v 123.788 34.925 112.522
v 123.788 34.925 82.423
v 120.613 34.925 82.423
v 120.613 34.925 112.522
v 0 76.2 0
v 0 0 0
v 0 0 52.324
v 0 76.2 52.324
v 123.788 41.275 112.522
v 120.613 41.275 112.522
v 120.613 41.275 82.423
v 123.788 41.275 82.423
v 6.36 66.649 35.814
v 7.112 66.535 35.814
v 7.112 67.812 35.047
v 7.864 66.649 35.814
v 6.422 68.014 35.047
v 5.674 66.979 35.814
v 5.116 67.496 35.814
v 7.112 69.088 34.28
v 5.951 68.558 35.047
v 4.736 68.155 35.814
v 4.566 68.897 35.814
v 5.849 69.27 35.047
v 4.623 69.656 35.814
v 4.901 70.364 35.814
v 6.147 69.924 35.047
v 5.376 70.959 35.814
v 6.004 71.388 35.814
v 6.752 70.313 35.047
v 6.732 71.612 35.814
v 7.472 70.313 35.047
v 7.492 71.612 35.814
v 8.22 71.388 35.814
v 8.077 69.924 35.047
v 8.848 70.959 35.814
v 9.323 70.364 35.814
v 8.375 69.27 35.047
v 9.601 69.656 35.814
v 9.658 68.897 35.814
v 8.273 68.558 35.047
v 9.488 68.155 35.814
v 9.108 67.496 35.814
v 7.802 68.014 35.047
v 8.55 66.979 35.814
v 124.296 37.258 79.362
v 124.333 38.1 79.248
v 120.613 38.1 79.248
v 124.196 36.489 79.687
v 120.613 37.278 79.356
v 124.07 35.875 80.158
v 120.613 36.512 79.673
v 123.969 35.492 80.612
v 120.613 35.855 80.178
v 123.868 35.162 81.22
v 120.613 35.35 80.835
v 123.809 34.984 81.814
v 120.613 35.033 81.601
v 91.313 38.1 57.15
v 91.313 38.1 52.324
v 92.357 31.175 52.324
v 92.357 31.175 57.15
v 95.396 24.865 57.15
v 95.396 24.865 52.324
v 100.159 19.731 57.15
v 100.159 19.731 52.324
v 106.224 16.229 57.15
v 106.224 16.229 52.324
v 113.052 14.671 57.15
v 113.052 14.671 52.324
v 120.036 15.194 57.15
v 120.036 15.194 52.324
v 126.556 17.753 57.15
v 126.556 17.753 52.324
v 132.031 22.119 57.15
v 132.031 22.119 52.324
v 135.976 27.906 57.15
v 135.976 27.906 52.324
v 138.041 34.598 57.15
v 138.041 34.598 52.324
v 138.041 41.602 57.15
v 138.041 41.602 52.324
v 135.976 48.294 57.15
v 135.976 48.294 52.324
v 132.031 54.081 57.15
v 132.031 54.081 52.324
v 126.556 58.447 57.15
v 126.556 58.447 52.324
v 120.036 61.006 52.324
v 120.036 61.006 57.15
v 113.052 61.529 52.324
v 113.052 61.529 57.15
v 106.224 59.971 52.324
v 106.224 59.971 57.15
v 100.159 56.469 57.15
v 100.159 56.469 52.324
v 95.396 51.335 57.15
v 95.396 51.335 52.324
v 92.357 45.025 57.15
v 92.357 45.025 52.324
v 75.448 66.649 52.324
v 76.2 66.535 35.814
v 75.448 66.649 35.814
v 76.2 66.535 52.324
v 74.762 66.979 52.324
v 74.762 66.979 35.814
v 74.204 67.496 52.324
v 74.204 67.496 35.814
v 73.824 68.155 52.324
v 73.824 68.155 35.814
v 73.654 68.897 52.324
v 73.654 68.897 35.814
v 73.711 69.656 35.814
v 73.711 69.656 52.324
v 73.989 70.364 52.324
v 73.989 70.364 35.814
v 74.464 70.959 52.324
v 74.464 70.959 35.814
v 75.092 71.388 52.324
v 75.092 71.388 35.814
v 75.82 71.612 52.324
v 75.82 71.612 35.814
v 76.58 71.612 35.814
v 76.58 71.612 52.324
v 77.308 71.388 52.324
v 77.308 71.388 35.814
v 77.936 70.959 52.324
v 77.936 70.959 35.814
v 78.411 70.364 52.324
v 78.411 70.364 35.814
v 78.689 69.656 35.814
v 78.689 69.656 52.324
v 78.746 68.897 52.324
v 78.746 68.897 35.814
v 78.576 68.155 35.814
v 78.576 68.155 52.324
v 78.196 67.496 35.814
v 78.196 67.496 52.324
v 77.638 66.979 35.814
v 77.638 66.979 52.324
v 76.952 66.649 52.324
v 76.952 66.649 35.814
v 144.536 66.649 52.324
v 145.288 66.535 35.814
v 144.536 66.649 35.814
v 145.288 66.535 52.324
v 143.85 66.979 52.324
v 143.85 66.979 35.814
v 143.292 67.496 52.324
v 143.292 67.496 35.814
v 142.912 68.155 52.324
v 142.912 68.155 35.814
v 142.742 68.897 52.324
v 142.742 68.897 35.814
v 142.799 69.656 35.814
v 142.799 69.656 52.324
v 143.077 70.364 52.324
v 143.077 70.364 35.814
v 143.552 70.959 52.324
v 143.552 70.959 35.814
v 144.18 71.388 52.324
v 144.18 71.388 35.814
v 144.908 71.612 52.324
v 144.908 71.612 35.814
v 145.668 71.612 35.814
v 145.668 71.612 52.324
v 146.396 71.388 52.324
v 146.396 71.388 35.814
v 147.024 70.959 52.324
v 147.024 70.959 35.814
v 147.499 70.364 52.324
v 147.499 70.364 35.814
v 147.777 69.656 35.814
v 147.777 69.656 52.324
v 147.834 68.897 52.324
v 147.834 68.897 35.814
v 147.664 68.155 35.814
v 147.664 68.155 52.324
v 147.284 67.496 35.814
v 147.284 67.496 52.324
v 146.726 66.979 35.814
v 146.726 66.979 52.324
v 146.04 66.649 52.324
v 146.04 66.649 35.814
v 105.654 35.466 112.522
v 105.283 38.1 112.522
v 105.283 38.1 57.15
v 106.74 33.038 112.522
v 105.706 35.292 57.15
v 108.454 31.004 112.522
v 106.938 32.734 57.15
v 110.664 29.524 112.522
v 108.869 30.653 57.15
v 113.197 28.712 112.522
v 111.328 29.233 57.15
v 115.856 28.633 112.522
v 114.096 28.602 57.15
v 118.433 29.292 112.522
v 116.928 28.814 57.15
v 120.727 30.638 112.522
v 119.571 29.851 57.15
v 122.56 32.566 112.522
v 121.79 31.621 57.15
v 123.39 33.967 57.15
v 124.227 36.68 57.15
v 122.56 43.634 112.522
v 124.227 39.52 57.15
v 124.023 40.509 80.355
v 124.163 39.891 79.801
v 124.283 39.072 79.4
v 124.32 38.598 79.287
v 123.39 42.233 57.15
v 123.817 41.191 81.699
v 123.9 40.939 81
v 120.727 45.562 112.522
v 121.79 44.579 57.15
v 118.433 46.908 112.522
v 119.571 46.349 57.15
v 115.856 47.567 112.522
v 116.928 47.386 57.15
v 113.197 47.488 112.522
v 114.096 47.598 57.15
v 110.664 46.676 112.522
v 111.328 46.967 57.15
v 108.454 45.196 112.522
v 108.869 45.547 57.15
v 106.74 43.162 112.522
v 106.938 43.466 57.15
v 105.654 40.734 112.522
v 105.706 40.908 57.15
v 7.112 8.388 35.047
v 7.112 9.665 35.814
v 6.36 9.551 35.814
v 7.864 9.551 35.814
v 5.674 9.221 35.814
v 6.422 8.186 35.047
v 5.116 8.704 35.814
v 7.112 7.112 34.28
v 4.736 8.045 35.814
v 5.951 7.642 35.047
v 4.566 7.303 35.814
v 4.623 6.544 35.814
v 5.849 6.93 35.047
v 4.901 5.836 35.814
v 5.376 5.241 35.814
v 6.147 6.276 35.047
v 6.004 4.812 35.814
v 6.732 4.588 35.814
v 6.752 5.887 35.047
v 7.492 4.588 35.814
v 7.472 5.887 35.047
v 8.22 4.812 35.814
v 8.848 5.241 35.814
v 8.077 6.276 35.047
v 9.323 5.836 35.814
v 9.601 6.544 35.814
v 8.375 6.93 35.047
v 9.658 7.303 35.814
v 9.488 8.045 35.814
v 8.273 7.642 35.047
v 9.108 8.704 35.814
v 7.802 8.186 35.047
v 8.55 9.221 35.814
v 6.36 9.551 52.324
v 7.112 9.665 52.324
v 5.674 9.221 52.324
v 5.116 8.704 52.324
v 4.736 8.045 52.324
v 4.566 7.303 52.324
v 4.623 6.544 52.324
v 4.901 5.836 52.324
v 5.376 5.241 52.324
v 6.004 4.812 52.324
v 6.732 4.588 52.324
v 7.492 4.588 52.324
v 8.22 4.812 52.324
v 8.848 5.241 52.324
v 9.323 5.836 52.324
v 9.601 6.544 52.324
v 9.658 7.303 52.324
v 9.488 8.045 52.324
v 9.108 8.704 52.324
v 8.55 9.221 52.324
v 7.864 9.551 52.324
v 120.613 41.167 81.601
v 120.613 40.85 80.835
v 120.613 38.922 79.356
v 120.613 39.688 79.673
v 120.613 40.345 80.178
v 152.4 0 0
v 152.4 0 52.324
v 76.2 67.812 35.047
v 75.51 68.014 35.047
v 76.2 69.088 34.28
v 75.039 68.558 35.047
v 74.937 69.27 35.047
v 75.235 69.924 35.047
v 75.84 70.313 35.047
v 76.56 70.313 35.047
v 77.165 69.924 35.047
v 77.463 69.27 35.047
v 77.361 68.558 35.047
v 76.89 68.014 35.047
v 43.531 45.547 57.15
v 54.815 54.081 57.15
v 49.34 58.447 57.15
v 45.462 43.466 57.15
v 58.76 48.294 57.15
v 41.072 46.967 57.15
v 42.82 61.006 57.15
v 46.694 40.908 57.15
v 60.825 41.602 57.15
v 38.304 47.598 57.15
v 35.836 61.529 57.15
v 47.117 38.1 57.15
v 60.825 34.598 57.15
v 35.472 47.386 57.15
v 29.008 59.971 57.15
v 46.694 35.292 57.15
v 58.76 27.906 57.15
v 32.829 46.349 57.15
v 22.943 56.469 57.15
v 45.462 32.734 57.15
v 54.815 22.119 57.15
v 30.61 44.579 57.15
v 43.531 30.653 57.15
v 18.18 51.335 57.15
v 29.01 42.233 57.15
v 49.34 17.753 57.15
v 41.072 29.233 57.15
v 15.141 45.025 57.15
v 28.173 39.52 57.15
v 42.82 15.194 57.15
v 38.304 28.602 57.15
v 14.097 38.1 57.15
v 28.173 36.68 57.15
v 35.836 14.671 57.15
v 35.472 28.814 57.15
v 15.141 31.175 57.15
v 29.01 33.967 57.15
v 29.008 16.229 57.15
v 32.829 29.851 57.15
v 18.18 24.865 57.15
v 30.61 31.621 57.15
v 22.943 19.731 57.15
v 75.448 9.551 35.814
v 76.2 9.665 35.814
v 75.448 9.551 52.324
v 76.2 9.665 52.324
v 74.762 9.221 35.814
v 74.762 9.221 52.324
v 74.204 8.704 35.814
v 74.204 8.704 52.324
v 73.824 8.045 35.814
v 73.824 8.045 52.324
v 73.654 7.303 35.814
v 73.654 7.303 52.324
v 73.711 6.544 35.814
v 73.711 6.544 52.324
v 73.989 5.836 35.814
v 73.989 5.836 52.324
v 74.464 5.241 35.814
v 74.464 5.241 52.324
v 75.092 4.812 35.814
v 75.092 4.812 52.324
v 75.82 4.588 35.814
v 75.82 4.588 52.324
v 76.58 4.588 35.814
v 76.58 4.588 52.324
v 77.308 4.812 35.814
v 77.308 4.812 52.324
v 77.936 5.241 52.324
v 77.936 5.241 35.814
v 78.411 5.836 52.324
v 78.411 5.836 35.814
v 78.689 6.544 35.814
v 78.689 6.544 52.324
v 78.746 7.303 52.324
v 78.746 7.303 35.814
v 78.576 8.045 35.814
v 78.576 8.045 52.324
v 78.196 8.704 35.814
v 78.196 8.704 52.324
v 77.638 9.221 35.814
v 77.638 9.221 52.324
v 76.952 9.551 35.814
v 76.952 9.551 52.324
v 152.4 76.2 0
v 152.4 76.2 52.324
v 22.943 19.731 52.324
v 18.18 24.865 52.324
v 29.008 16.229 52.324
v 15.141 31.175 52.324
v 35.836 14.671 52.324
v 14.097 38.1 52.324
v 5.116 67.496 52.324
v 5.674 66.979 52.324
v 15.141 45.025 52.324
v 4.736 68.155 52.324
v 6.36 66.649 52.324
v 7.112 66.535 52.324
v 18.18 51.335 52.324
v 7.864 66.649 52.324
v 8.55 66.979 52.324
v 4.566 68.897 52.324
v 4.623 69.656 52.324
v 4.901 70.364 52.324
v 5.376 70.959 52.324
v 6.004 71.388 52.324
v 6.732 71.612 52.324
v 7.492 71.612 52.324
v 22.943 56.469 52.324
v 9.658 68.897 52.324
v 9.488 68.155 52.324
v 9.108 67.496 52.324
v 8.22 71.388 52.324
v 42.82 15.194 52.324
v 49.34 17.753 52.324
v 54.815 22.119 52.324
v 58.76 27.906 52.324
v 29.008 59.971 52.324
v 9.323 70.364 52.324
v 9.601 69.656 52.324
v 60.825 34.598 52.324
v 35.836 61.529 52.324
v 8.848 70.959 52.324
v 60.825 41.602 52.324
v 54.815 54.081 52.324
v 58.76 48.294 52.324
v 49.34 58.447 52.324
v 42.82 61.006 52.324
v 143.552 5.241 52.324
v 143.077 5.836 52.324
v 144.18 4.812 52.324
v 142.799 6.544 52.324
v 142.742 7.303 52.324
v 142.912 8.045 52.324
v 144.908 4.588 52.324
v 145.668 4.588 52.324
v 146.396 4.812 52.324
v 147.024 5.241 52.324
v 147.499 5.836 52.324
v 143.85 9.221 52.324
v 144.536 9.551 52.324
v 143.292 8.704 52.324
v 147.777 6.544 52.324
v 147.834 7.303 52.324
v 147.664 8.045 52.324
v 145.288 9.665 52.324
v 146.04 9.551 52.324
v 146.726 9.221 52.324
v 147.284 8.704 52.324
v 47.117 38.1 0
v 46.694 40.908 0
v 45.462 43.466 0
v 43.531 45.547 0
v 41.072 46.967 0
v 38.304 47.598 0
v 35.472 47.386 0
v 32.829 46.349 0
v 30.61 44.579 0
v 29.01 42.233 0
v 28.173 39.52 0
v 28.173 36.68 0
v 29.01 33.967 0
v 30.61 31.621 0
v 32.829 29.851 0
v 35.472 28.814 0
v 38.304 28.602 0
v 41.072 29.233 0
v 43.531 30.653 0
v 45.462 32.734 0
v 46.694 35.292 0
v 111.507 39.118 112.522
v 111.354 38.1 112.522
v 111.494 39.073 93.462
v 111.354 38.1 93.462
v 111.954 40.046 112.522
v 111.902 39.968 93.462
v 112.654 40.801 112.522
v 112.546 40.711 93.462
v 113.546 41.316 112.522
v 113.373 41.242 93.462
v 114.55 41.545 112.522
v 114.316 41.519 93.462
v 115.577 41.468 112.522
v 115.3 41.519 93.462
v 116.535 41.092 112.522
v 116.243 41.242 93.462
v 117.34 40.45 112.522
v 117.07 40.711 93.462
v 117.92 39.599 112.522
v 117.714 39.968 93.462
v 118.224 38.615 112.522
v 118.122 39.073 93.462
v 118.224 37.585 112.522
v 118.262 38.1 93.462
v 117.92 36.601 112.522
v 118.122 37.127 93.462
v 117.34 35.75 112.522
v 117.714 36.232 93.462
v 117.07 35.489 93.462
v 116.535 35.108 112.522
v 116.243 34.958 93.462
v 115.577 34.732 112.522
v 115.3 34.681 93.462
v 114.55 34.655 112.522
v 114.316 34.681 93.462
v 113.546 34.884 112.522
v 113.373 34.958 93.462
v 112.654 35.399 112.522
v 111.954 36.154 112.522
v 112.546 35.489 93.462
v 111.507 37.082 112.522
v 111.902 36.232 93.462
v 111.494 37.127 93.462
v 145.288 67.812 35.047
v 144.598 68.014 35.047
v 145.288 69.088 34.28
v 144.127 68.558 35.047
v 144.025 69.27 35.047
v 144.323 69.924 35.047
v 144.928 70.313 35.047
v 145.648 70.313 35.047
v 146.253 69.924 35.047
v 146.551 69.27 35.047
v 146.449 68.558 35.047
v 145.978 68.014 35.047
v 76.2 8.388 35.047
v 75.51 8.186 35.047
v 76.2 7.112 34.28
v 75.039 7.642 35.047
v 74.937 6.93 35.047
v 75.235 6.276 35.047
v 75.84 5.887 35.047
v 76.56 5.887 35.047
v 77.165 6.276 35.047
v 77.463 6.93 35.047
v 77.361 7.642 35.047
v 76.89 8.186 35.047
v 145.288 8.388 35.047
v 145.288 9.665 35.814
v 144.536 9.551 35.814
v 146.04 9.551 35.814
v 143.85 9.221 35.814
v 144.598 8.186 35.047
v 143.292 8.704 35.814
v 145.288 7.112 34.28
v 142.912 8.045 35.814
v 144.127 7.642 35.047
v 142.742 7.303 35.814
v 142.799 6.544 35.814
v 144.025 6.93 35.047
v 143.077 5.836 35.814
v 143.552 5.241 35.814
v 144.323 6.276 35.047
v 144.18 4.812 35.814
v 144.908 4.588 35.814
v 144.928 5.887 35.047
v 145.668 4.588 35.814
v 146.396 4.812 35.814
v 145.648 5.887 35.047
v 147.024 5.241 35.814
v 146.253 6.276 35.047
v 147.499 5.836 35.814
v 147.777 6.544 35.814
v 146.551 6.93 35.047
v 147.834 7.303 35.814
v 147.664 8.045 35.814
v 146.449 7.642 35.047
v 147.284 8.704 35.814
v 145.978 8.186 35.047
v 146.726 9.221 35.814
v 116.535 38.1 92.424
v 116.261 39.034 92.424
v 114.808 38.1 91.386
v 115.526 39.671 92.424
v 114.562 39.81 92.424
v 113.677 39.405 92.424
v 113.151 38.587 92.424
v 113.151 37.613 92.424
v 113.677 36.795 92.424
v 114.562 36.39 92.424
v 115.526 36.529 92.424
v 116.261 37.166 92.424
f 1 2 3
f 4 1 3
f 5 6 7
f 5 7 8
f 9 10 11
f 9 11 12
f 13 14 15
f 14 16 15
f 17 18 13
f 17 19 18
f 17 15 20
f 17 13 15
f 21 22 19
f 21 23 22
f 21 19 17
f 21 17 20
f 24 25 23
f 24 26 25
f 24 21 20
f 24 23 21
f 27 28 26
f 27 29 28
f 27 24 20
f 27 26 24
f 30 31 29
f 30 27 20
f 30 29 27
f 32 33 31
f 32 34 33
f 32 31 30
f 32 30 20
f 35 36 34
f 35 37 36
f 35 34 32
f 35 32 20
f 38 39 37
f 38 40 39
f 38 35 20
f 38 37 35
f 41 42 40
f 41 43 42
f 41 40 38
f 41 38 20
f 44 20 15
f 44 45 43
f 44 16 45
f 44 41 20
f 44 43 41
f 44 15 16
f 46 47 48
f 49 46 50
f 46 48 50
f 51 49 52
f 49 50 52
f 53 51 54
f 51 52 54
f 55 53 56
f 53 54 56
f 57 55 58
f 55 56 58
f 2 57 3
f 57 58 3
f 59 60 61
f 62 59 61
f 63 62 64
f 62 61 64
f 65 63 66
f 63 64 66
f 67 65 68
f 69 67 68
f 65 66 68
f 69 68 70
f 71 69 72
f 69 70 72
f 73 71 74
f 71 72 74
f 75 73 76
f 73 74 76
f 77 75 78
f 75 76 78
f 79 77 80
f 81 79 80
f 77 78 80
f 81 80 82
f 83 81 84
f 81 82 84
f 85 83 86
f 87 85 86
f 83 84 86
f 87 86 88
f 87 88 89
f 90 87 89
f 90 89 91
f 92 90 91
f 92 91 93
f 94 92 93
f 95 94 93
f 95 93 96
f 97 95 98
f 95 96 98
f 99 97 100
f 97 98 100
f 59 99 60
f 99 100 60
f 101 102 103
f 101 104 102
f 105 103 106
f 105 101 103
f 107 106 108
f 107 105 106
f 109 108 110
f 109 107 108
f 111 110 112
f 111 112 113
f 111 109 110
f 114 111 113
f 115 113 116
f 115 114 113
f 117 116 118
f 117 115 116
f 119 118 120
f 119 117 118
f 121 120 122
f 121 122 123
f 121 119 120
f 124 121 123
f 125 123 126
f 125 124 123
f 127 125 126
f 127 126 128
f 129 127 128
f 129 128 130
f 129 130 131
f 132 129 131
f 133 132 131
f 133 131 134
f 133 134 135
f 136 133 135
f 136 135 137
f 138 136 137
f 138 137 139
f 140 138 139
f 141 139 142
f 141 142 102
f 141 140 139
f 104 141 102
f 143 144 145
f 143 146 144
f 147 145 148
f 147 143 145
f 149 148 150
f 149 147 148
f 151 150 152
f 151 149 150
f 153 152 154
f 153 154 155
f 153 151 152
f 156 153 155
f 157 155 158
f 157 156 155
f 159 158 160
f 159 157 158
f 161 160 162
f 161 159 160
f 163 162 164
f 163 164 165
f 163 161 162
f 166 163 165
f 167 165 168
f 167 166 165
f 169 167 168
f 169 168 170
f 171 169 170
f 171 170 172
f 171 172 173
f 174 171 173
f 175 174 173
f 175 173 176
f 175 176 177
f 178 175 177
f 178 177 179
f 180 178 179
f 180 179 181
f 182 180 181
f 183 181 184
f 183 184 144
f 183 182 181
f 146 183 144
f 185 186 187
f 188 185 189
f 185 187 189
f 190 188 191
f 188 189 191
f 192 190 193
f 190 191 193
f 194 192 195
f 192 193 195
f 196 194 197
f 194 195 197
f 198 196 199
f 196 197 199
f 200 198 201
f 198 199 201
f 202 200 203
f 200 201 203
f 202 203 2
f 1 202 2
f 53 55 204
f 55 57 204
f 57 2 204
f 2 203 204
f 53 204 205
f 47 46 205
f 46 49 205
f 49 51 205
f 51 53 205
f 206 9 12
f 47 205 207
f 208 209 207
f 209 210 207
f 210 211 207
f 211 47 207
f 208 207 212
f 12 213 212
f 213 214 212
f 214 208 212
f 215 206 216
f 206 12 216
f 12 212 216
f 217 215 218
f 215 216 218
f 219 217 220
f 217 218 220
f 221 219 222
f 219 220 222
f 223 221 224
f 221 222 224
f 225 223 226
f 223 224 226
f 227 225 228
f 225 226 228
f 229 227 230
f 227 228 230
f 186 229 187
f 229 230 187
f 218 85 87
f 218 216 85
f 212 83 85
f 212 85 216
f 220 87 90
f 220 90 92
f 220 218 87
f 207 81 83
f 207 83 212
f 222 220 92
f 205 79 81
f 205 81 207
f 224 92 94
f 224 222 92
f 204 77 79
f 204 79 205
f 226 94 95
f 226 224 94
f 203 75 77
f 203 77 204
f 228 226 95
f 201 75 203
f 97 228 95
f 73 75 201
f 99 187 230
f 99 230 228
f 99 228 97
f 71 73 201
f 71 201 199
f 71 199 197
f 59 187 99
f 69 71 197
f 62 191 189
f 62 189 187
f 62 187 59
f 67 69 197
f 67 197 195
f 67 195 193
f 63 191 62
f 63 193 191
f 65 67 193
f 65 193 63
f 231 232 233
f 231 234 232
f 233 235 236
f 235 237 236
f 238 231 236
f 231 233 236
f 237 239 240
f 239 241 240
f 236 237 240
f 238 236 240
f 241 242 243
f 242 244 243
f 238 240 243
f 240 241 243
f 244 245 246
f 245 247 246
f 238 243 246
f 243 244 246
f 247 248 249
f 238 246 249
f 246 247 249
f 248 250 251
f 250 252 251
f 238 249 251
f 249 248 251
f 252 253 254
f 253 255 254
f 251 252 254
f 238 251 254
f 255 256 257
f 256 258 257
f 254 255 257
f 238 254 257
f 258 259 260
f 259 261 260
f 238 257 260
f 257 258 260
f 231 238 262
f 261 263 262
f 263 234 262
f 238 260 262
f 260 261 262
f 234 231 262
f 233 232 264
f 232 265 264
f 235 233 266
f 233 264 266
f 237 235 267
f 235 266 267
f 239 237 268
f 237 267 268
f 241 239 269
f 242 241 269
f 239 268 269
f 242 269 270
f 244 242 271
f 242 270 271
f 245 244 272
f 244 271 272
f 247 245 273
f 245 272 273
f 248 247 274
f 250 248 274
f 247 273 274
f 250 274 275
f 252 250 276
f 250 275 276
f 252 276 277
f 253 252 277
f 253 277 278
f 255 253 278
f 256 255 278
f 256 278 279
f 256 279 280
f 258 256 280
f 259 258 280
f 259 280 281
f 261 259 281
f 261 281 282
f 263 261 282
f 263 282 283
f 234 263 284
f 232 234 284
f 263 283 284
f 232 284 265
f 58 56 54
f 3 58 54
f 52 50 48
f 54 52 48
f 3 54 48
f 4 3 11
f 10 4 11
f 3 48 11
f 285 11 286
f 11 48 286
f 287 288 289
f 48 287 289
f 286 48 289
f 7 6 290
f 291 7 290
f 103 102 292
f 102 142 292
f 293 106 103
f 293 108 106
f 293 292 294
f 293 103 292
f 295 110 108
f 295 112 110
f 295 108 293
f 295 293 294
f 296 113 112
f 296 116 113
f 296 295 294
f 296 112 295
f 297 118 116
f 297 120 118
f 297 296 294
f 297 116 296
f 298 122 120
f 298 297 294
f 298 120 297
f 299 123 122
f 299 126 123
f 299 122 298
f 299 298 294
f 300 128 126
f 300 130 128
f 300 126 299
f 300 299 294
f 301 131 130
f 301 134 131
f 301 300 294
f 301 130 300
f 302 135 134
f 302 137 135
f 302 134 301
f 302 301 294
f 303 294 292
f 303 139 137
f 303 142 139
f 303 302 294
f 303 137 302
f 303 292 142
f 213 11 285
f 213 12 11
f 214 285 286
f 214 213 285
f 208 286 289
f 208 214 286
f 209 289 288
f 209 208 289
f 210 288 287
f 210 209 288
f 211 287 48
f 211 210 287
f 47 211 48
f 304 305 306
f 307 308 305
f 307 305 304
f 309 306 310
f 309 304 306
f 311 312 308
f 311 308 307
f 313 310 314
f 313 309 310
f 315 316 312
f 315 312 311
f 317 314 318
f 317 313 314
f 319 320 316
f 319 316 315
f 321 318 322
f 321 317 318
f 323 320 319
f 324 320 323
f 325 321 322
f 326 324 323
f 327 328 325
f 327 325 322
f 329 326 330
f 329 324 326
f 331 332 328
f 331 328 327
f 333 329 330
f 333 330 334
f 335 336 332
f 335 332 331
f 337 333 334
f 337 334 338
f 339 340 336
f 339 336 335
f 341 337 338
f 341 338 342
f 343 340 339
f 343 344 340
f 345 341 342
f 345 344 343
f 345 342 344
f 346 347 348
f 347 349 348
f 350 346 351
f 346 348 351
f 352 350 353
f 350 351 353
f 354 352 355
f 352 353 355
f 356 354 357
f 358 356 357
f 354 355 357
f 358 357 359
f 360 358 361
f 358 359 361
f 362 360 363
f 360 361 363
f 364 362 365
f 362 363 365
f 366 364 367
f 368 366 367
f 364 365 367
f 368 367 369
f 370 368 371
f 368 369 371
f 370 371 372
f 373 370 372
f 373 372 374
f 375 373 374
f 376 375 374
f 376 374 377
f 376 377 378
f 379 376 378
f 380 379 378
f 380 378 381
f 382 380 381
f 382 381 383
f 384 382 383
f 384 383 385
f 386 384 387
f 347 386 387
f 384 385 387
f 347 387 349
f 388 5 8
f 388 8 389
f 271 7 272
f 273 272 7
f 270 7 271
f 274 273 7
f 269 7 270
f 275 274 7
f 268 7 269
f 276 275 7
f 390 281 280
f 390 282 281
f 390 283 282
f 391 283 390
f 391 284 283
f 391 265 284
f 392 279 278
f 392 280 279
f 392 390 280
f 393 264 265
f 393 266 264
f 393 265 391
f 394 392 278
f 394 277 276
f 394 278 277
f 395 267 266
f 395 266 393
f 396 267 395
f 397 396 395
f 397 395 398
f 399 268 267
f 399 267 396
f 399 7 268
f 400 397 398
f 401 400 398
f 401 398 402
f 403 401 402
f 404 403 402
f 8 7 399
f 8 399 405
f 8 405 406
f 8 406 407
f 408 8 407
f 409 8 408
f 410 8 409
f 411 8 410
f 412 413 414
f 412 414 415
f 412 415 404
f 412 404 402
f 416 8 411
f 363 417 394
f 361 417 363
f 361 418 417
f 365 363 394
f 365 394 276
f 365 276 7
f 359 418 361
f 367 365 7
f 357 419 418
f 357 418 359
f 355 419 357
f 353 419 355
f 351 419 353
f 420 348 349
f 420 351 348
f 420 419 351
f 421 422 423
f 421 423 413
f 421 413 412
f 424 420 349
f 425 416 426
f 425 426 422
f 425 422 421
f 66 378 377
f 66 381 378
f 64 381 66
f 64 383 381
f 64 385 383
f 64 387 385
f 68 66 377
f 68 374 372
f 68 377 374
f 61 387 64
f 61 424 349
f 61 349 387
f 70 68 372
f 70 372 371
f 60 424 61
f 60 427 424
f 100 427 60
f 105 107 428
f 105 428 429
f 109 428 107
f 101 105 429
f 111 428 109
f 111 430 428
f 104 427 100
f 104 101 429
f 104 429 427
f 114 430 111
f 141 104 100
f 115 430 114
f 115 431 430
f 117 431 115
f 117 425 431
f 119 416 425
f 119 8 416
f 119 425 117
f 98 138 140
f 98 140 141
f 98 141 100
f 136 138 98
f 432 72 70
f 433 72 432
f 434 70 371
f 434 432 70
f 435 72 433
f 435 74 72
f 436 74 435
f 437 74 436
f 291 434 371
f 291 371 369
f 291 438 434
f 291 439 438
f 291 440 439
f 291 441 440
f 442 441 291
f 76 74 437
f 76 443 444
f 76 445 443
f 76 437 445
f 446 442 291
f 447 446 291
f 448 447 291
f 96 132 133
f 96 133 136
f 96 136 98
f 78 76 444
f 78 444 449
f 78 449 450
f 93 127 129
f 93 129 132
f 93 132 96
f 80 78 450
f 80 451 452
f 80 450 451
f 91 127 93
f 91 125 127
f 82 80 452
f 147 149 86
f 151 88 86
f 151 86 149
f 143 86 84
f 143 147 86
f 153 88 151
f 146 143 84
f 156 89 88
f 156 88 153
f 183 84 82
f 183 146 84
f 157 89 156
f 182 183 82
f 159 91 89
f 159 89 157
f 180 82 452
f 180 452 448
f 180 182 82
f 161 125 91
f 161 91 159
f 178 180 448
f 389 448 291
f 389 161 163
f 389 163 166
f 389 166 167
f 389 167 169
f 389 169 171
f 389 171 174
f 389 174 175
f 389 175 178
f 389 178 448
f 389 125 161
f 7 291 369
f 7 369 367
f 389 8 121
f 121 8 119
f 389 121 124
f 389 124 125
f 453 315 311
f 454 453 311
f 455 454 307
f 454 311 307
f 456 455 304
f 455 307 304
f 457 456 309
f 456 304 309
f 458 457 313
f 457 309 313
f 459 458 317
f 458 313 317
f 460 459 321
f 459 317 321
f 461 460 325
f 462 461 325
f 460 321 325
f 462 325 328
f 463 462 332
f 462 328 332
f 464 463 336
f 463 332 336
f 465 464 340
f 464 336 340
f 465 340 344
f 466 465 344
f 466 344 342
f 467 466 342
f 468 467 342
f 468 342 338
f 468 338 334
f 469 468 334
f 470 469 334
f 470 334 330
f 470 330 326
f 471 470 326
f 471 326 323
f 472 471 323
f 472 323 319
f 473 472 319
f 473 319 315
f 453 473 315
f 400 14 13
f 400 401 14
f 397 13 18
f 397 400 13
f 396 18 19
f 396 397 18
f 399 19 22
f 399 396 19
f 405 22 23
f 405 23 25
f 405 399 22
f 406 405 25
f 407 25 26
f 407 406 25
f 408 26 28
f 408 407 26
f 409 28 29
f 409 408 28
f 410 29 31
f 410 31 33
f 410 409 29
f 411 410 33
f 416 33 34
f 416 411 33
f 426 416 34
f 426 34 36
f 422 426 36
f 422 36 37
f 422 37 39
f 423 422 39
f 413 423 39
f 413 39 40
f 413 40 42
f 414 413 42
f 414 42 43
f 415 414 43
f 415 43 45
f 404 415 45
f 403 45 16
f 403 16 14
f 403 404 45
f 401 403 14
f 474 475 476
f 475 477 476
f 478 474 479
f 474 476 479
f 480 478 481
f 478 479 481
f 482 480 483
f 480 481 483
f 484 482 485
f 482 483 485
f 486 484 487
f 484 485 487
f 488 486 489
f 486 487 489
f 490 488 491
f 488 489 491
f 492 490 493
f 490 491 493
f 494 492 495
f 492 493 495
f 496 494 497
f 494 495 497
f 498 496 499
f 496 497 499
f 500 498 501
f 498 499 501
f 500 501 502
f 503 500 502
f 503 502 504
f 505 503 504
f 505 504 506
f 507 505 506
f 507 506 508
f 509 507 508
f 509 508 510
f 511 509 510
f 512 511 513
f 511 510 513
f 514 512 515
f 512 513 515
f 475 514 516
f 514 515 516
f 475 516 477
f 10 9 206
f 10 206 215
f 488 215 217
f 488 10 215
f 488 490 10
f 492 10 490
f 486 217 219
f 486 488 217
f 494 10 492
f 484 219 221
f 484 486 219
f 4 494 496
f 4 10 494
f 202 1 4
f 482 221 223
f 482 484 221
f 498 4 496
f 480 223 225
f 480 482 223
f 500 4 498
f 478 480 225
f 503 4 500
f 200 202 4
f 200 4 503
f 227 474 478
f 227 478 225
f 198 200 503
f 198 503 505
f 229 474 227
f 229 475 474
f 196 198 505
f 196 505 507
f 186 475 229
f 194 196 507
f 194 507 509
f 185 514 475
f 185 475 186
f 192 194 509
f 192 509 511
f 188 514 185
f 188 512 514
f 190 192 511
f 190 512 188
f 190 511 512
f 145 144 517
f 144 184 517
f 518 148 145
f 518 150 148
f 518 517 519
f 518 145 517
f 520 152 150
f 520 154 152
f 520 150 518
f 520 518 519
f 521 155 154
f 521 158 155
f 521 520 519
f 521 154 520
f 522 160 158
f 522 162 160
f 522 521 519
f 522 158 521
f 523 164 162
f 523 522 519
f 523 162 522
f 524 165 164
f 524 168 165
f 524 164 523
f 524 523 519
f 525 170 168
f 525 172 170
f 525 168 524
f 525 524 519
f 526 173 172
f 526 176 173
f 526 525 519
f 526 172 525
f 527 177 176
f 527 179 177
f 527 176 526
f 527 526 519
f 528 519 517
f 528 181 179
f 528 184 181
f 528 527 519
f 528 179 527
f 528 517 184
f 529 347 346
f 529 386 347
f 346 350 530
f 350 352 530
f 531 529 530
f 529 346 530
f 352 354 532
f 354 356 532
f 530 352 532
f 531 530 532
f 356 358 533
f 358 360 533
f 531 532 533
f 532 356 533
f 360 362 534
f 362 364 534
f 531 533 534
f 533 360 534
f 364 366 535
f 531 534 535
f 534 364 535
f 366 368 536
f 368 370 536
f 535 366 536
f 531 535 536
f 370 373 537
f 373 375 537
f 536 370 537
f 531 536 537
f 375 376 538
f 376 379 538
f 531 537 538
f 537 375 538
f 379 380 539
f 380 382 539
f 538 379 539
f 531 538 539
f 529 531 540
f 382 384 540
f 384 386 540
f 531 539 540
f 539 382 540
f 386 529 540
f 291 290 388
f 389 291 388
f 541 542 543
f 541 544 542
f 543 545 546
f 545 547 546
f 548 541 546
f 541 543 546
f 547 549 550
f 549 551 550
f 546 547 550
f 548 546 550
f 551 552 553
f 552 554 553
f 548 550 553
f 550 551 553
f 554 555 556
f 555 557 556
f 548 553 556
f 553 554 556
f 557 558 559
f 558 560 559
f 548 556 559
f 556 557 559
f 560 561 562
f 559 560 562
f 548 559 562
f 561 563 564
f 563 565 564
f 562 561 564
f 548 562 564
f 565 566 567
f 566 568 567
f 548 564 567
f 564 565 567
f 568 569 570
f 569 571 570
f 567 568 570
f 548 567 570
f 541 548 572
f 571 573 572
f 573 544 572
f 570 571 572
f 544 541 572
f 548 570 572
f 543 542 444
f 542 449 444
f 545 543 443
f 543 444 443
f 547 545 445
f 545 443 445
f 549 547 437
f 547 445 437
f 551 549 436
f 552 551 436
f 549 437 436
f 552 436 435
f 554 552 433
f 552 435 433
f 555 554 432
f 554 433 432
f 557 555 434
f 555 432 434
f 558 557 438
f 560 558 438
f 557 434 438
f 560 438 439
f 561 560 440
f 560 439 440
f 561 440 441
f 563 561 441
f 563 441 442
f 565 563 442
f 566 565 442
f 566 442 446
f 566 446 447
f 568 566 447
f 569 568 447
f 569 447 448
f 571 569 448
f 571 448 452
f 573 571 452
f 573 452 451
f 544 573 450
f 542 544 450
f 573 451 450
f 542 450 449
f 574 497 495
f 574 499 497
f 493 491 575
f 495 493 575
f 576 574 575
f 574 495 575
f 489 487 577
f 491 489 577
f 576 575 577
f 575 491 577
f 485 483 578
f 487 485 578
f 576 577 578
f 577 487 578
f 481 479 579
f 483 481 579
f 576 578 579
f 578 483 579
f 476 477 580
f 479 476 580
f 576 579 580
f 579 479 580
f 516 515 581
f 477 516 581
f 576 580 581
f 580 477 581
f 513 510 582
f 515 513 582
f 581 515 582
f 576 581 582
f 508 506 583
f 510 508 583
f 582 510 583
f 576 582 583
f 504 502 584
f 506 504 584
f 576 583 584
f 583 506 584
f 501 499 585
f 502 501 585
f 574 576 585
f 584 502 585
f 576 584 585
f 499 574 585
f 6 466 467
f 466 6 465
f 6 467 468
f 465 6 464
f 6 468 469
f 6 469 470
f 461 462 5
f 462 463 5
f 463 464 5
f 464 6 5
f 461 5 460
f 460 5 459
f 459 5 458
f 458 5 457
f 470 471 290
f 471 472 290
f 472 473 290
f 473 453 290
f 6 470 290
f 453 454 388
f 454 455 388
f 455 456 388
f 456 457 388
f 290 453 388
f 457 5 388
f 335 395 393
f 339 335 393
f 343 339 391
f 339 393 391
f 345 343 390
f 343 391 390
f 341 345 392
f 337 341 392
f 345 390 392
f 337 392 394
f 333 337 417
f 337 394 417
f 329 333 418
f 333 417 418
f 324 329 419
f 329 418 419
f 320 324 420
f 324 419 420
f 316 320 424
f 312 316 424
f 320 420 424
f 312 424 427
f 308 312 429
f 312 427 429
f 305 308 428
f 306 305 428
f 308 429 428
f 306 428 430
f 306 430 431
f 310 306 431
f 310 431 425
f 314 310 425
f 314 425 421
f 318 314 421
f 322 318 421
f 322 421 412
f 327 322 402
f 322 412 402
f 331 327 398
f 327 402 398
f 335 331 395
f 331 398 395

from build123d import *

# Parameters (mm, degrees)
SKETCH1_W                        = 152.4
SKETCH1_H                        = 76.2
BOSS_EXTRUDE1_DEPTH              = 52.324
F_1_4_20_TAPPED_HOLE1_AT_2_COUNT = 2
F_1_4_20_TAPPED_HOLE1_AT_2_PITCH = 69.088
F_1_4_20_TAPPED_HOLE1_AT_3_COUNT = 2
F_1_4_20_TAPPED_HOLE1_AT_3_PITCH = 69.088
SKETCH4_R                        = 23.495
BOSS_EXTRUDE2_DEPTH              = 4.826
SKETCH5_R                        = 9.525
BOSS_EXTRUDE3_DEPTH              = 60.198
CUT_EXTRUDE1_START               = -33.274
CUT_EXTRUDE1_DEPTH               = 33.274
FILLET1_R                        = 3.175
SKETCH7_R                        = 9.525
CUT_EXTRUDE2_DEPTH               = 180.717340566
F_5_16_24_TAPPED_HOLE1_D         = 6.9088
F_5_16_24_TAPPED_HOLE1_DEPTH     = 19.06
F_5_16_24_TAPPED_HOLE1_TIP       = 2.075612922


with BuildPart() as part:
    # Sketch1 → Boss-Extrude1 (new body)
    with BuildSketch(Plane.XY):
        with Locations((76.2, 38.1)):
            Rectangle(SKETCH1_W, SKETCH1_H)
    extrude(amount=BOSS_EXTRUDE1_DEPTH)

    # Sketch2 → 1/4-20 Tapped Hole1 (revolve, cut)
    with BuildSketch(Plane(origin=(76.2, 69.088, 52.324), x_dir=(0, -1, 0), z_dir=(1, 0, 0))):
        Polygon((0, 0), (0, 18.043816902), (2.5527, 16.51), (2.5527, 0), align=None)
    f_1_4_20_tapped_hole1 = revolve(axis=Axis((76.2, 69.088, 58.674), (0, 0, -1)), mode=Mode.SUBTRACT)

    # 1/4-20 Tapped Hole1 at 2: 1/4-20 Tapped Hole1 ×2
    with Locations(*[(-i * F_1_4_20_TAPPED_HOLE1_AT_2_PITCH, 0, 0) for i in range(1, F_1_4_20_TAPPED_HOLE1_AT_2_COUNT)]):
        add(f_1_4_20_tapped_hole1, mode=Mode.SUBTRACT)

    # 1/4-20 Tapped Hole1 at 3: 1/4-20 Tapped Hole1 ×2
    with Locations(*[(i * F_1_4_20_TAPPED_HOLE1_AT_3_PITCH, 0, 0) for i in range(1, F_1_4_20_TAPPED_HOLE1_AT_3_COUNT)]):
        add(f_1_4_20_tapped_hole1, mode=Mode.SUBTRACT)

    # Mirror1: 1/4-20 Tapped Hole1 across plane
    add(f_1_4_20_tapped_hole1.mirror(Plane.ZX.offset(38.1)), mode=Mode.SUBTRACT)

    # Mirror1 copy 1 sketch → Mirror1 copy 1 (revolve, cut)
    with BuildSketch(Plane(origin=(7.112, 7.112, 52.324), x_dir=(0, 1, 0), z_dir=(1, 0, 0))):
        Polygon((0, 0), (0, -18.043816902), (2.5527, -16.51), (2.5527, 0), align=None)
    revolve(axis=Axis((7.112, 7.112, 58.674), (0, 0, 1)), mode=Mode.SUBTRACT)

    # Mirror1 copy 2 sketch → Mirror1 copy 2 (revolve, cut)
    with BuildSketch(Plane(origin=(145.288, 7.112, 52.324), x_dir=(0, 1, 0), z_dir=(1, 0, 0))):
        Polygon((0, 0), (0, -18.043816902), (2.5527, -16.51), (2.5527, 0), align=None)
    revolve(axis=Axis((145.288, 7.112, 58.674), (0, 0, 1)), mode=Mode.SUBTRACT)

    # Sketch4 → Boss-Extrude2 (add)
    with BuildSketch(Plane.XY.offset(52.324)):
        with Locations(Location((37.592, 38.1, 0), (0, 0, 180))):
            Circle(SKETCH4_R)
        with Locations(Location((114.808, 38.1, 0), (0, 0, 180))):
            Circle(SKETCH4_R)
    extrude(amount=BOSS_EXTRUDE2_DEPTH)

    # Sketch5 → Boss-Extrude3 (add)
    with BuildSketch(Plane.XY.offset(52.324)):
        with Locations(Location((114.808, 38.1, 0), (0, 0, 180))):
            Circle(SKETCH5_R)
    extrude(amount=BOSS_EXTRUDE3_DEPTH)

    # Sketch6 → Cut-Extrude1 (cut)
    with BuildSketch(Plane.XY.offset(112.522).offset(CUT_EXTRUDE1_START)):
        with BuildLine():
            Line((120.613256121, 34.925), (120.613256121, 41.275))
            Line((120.613256121, 41.275), (123.788256121, 41.275))
            ThreePointArc((123.788256121, 41.275), (124.333, 38.1), (123.788256121, 34.925))
            Line((123.788256121, 34.925), (120.613256121, 34.925))
        make_face()
    extrude(amount=CUT_EXTRUDE1_DEPTH, mode=Mode.SUBTRACT)

    # Fillet1
    fillet1_edges = [part.edges().sort_by_distance(p)[0] for p in [
        (122.200756121, 41.275, 79.248),
        (122.200756121, 34.925, 79.248),
    ]]
    fillet(fillet1_edges, radius=FILLET1_R - 0.0001)  # a hair under: the kernel refuses the full size

    # Sketch7 → Cut-Extrude2 (cut, through all)
    with BuildSketch(Plane.XY.offset(57.15)):
        with Locations((37.592, 38.1)):
            Circle(SKETCH7_R)
    extrude(amount=-CUT_EXTRUDE2_DEPTH, mode=Mode.SUBTRACT)

    # 5/16-24 Tapped Hole1
    with Locations(Plane.XY.offset(112.522)):
        with Locations((114.808, 38.1)):
            Hole(F_5_16_24_TAPPED_HOLE1_D / 2, depth=F_5_16_24_TAPPED_HOLE1_DEPTH)
            with Locations((0, 0, -(F_5_16_24_TAPPED_HOLE1_DEPTH + F_5_16_24_TAPPED_HOLE1_TIP / 2))):  # 118° drill point
                Cone(0, F_5_16_24_TAPPED_HOLE1_D / 2, F_5_16_24_TAPPED_HOLE1_TIP, mode=Mode.SUBTRACT)


solid = part.part
